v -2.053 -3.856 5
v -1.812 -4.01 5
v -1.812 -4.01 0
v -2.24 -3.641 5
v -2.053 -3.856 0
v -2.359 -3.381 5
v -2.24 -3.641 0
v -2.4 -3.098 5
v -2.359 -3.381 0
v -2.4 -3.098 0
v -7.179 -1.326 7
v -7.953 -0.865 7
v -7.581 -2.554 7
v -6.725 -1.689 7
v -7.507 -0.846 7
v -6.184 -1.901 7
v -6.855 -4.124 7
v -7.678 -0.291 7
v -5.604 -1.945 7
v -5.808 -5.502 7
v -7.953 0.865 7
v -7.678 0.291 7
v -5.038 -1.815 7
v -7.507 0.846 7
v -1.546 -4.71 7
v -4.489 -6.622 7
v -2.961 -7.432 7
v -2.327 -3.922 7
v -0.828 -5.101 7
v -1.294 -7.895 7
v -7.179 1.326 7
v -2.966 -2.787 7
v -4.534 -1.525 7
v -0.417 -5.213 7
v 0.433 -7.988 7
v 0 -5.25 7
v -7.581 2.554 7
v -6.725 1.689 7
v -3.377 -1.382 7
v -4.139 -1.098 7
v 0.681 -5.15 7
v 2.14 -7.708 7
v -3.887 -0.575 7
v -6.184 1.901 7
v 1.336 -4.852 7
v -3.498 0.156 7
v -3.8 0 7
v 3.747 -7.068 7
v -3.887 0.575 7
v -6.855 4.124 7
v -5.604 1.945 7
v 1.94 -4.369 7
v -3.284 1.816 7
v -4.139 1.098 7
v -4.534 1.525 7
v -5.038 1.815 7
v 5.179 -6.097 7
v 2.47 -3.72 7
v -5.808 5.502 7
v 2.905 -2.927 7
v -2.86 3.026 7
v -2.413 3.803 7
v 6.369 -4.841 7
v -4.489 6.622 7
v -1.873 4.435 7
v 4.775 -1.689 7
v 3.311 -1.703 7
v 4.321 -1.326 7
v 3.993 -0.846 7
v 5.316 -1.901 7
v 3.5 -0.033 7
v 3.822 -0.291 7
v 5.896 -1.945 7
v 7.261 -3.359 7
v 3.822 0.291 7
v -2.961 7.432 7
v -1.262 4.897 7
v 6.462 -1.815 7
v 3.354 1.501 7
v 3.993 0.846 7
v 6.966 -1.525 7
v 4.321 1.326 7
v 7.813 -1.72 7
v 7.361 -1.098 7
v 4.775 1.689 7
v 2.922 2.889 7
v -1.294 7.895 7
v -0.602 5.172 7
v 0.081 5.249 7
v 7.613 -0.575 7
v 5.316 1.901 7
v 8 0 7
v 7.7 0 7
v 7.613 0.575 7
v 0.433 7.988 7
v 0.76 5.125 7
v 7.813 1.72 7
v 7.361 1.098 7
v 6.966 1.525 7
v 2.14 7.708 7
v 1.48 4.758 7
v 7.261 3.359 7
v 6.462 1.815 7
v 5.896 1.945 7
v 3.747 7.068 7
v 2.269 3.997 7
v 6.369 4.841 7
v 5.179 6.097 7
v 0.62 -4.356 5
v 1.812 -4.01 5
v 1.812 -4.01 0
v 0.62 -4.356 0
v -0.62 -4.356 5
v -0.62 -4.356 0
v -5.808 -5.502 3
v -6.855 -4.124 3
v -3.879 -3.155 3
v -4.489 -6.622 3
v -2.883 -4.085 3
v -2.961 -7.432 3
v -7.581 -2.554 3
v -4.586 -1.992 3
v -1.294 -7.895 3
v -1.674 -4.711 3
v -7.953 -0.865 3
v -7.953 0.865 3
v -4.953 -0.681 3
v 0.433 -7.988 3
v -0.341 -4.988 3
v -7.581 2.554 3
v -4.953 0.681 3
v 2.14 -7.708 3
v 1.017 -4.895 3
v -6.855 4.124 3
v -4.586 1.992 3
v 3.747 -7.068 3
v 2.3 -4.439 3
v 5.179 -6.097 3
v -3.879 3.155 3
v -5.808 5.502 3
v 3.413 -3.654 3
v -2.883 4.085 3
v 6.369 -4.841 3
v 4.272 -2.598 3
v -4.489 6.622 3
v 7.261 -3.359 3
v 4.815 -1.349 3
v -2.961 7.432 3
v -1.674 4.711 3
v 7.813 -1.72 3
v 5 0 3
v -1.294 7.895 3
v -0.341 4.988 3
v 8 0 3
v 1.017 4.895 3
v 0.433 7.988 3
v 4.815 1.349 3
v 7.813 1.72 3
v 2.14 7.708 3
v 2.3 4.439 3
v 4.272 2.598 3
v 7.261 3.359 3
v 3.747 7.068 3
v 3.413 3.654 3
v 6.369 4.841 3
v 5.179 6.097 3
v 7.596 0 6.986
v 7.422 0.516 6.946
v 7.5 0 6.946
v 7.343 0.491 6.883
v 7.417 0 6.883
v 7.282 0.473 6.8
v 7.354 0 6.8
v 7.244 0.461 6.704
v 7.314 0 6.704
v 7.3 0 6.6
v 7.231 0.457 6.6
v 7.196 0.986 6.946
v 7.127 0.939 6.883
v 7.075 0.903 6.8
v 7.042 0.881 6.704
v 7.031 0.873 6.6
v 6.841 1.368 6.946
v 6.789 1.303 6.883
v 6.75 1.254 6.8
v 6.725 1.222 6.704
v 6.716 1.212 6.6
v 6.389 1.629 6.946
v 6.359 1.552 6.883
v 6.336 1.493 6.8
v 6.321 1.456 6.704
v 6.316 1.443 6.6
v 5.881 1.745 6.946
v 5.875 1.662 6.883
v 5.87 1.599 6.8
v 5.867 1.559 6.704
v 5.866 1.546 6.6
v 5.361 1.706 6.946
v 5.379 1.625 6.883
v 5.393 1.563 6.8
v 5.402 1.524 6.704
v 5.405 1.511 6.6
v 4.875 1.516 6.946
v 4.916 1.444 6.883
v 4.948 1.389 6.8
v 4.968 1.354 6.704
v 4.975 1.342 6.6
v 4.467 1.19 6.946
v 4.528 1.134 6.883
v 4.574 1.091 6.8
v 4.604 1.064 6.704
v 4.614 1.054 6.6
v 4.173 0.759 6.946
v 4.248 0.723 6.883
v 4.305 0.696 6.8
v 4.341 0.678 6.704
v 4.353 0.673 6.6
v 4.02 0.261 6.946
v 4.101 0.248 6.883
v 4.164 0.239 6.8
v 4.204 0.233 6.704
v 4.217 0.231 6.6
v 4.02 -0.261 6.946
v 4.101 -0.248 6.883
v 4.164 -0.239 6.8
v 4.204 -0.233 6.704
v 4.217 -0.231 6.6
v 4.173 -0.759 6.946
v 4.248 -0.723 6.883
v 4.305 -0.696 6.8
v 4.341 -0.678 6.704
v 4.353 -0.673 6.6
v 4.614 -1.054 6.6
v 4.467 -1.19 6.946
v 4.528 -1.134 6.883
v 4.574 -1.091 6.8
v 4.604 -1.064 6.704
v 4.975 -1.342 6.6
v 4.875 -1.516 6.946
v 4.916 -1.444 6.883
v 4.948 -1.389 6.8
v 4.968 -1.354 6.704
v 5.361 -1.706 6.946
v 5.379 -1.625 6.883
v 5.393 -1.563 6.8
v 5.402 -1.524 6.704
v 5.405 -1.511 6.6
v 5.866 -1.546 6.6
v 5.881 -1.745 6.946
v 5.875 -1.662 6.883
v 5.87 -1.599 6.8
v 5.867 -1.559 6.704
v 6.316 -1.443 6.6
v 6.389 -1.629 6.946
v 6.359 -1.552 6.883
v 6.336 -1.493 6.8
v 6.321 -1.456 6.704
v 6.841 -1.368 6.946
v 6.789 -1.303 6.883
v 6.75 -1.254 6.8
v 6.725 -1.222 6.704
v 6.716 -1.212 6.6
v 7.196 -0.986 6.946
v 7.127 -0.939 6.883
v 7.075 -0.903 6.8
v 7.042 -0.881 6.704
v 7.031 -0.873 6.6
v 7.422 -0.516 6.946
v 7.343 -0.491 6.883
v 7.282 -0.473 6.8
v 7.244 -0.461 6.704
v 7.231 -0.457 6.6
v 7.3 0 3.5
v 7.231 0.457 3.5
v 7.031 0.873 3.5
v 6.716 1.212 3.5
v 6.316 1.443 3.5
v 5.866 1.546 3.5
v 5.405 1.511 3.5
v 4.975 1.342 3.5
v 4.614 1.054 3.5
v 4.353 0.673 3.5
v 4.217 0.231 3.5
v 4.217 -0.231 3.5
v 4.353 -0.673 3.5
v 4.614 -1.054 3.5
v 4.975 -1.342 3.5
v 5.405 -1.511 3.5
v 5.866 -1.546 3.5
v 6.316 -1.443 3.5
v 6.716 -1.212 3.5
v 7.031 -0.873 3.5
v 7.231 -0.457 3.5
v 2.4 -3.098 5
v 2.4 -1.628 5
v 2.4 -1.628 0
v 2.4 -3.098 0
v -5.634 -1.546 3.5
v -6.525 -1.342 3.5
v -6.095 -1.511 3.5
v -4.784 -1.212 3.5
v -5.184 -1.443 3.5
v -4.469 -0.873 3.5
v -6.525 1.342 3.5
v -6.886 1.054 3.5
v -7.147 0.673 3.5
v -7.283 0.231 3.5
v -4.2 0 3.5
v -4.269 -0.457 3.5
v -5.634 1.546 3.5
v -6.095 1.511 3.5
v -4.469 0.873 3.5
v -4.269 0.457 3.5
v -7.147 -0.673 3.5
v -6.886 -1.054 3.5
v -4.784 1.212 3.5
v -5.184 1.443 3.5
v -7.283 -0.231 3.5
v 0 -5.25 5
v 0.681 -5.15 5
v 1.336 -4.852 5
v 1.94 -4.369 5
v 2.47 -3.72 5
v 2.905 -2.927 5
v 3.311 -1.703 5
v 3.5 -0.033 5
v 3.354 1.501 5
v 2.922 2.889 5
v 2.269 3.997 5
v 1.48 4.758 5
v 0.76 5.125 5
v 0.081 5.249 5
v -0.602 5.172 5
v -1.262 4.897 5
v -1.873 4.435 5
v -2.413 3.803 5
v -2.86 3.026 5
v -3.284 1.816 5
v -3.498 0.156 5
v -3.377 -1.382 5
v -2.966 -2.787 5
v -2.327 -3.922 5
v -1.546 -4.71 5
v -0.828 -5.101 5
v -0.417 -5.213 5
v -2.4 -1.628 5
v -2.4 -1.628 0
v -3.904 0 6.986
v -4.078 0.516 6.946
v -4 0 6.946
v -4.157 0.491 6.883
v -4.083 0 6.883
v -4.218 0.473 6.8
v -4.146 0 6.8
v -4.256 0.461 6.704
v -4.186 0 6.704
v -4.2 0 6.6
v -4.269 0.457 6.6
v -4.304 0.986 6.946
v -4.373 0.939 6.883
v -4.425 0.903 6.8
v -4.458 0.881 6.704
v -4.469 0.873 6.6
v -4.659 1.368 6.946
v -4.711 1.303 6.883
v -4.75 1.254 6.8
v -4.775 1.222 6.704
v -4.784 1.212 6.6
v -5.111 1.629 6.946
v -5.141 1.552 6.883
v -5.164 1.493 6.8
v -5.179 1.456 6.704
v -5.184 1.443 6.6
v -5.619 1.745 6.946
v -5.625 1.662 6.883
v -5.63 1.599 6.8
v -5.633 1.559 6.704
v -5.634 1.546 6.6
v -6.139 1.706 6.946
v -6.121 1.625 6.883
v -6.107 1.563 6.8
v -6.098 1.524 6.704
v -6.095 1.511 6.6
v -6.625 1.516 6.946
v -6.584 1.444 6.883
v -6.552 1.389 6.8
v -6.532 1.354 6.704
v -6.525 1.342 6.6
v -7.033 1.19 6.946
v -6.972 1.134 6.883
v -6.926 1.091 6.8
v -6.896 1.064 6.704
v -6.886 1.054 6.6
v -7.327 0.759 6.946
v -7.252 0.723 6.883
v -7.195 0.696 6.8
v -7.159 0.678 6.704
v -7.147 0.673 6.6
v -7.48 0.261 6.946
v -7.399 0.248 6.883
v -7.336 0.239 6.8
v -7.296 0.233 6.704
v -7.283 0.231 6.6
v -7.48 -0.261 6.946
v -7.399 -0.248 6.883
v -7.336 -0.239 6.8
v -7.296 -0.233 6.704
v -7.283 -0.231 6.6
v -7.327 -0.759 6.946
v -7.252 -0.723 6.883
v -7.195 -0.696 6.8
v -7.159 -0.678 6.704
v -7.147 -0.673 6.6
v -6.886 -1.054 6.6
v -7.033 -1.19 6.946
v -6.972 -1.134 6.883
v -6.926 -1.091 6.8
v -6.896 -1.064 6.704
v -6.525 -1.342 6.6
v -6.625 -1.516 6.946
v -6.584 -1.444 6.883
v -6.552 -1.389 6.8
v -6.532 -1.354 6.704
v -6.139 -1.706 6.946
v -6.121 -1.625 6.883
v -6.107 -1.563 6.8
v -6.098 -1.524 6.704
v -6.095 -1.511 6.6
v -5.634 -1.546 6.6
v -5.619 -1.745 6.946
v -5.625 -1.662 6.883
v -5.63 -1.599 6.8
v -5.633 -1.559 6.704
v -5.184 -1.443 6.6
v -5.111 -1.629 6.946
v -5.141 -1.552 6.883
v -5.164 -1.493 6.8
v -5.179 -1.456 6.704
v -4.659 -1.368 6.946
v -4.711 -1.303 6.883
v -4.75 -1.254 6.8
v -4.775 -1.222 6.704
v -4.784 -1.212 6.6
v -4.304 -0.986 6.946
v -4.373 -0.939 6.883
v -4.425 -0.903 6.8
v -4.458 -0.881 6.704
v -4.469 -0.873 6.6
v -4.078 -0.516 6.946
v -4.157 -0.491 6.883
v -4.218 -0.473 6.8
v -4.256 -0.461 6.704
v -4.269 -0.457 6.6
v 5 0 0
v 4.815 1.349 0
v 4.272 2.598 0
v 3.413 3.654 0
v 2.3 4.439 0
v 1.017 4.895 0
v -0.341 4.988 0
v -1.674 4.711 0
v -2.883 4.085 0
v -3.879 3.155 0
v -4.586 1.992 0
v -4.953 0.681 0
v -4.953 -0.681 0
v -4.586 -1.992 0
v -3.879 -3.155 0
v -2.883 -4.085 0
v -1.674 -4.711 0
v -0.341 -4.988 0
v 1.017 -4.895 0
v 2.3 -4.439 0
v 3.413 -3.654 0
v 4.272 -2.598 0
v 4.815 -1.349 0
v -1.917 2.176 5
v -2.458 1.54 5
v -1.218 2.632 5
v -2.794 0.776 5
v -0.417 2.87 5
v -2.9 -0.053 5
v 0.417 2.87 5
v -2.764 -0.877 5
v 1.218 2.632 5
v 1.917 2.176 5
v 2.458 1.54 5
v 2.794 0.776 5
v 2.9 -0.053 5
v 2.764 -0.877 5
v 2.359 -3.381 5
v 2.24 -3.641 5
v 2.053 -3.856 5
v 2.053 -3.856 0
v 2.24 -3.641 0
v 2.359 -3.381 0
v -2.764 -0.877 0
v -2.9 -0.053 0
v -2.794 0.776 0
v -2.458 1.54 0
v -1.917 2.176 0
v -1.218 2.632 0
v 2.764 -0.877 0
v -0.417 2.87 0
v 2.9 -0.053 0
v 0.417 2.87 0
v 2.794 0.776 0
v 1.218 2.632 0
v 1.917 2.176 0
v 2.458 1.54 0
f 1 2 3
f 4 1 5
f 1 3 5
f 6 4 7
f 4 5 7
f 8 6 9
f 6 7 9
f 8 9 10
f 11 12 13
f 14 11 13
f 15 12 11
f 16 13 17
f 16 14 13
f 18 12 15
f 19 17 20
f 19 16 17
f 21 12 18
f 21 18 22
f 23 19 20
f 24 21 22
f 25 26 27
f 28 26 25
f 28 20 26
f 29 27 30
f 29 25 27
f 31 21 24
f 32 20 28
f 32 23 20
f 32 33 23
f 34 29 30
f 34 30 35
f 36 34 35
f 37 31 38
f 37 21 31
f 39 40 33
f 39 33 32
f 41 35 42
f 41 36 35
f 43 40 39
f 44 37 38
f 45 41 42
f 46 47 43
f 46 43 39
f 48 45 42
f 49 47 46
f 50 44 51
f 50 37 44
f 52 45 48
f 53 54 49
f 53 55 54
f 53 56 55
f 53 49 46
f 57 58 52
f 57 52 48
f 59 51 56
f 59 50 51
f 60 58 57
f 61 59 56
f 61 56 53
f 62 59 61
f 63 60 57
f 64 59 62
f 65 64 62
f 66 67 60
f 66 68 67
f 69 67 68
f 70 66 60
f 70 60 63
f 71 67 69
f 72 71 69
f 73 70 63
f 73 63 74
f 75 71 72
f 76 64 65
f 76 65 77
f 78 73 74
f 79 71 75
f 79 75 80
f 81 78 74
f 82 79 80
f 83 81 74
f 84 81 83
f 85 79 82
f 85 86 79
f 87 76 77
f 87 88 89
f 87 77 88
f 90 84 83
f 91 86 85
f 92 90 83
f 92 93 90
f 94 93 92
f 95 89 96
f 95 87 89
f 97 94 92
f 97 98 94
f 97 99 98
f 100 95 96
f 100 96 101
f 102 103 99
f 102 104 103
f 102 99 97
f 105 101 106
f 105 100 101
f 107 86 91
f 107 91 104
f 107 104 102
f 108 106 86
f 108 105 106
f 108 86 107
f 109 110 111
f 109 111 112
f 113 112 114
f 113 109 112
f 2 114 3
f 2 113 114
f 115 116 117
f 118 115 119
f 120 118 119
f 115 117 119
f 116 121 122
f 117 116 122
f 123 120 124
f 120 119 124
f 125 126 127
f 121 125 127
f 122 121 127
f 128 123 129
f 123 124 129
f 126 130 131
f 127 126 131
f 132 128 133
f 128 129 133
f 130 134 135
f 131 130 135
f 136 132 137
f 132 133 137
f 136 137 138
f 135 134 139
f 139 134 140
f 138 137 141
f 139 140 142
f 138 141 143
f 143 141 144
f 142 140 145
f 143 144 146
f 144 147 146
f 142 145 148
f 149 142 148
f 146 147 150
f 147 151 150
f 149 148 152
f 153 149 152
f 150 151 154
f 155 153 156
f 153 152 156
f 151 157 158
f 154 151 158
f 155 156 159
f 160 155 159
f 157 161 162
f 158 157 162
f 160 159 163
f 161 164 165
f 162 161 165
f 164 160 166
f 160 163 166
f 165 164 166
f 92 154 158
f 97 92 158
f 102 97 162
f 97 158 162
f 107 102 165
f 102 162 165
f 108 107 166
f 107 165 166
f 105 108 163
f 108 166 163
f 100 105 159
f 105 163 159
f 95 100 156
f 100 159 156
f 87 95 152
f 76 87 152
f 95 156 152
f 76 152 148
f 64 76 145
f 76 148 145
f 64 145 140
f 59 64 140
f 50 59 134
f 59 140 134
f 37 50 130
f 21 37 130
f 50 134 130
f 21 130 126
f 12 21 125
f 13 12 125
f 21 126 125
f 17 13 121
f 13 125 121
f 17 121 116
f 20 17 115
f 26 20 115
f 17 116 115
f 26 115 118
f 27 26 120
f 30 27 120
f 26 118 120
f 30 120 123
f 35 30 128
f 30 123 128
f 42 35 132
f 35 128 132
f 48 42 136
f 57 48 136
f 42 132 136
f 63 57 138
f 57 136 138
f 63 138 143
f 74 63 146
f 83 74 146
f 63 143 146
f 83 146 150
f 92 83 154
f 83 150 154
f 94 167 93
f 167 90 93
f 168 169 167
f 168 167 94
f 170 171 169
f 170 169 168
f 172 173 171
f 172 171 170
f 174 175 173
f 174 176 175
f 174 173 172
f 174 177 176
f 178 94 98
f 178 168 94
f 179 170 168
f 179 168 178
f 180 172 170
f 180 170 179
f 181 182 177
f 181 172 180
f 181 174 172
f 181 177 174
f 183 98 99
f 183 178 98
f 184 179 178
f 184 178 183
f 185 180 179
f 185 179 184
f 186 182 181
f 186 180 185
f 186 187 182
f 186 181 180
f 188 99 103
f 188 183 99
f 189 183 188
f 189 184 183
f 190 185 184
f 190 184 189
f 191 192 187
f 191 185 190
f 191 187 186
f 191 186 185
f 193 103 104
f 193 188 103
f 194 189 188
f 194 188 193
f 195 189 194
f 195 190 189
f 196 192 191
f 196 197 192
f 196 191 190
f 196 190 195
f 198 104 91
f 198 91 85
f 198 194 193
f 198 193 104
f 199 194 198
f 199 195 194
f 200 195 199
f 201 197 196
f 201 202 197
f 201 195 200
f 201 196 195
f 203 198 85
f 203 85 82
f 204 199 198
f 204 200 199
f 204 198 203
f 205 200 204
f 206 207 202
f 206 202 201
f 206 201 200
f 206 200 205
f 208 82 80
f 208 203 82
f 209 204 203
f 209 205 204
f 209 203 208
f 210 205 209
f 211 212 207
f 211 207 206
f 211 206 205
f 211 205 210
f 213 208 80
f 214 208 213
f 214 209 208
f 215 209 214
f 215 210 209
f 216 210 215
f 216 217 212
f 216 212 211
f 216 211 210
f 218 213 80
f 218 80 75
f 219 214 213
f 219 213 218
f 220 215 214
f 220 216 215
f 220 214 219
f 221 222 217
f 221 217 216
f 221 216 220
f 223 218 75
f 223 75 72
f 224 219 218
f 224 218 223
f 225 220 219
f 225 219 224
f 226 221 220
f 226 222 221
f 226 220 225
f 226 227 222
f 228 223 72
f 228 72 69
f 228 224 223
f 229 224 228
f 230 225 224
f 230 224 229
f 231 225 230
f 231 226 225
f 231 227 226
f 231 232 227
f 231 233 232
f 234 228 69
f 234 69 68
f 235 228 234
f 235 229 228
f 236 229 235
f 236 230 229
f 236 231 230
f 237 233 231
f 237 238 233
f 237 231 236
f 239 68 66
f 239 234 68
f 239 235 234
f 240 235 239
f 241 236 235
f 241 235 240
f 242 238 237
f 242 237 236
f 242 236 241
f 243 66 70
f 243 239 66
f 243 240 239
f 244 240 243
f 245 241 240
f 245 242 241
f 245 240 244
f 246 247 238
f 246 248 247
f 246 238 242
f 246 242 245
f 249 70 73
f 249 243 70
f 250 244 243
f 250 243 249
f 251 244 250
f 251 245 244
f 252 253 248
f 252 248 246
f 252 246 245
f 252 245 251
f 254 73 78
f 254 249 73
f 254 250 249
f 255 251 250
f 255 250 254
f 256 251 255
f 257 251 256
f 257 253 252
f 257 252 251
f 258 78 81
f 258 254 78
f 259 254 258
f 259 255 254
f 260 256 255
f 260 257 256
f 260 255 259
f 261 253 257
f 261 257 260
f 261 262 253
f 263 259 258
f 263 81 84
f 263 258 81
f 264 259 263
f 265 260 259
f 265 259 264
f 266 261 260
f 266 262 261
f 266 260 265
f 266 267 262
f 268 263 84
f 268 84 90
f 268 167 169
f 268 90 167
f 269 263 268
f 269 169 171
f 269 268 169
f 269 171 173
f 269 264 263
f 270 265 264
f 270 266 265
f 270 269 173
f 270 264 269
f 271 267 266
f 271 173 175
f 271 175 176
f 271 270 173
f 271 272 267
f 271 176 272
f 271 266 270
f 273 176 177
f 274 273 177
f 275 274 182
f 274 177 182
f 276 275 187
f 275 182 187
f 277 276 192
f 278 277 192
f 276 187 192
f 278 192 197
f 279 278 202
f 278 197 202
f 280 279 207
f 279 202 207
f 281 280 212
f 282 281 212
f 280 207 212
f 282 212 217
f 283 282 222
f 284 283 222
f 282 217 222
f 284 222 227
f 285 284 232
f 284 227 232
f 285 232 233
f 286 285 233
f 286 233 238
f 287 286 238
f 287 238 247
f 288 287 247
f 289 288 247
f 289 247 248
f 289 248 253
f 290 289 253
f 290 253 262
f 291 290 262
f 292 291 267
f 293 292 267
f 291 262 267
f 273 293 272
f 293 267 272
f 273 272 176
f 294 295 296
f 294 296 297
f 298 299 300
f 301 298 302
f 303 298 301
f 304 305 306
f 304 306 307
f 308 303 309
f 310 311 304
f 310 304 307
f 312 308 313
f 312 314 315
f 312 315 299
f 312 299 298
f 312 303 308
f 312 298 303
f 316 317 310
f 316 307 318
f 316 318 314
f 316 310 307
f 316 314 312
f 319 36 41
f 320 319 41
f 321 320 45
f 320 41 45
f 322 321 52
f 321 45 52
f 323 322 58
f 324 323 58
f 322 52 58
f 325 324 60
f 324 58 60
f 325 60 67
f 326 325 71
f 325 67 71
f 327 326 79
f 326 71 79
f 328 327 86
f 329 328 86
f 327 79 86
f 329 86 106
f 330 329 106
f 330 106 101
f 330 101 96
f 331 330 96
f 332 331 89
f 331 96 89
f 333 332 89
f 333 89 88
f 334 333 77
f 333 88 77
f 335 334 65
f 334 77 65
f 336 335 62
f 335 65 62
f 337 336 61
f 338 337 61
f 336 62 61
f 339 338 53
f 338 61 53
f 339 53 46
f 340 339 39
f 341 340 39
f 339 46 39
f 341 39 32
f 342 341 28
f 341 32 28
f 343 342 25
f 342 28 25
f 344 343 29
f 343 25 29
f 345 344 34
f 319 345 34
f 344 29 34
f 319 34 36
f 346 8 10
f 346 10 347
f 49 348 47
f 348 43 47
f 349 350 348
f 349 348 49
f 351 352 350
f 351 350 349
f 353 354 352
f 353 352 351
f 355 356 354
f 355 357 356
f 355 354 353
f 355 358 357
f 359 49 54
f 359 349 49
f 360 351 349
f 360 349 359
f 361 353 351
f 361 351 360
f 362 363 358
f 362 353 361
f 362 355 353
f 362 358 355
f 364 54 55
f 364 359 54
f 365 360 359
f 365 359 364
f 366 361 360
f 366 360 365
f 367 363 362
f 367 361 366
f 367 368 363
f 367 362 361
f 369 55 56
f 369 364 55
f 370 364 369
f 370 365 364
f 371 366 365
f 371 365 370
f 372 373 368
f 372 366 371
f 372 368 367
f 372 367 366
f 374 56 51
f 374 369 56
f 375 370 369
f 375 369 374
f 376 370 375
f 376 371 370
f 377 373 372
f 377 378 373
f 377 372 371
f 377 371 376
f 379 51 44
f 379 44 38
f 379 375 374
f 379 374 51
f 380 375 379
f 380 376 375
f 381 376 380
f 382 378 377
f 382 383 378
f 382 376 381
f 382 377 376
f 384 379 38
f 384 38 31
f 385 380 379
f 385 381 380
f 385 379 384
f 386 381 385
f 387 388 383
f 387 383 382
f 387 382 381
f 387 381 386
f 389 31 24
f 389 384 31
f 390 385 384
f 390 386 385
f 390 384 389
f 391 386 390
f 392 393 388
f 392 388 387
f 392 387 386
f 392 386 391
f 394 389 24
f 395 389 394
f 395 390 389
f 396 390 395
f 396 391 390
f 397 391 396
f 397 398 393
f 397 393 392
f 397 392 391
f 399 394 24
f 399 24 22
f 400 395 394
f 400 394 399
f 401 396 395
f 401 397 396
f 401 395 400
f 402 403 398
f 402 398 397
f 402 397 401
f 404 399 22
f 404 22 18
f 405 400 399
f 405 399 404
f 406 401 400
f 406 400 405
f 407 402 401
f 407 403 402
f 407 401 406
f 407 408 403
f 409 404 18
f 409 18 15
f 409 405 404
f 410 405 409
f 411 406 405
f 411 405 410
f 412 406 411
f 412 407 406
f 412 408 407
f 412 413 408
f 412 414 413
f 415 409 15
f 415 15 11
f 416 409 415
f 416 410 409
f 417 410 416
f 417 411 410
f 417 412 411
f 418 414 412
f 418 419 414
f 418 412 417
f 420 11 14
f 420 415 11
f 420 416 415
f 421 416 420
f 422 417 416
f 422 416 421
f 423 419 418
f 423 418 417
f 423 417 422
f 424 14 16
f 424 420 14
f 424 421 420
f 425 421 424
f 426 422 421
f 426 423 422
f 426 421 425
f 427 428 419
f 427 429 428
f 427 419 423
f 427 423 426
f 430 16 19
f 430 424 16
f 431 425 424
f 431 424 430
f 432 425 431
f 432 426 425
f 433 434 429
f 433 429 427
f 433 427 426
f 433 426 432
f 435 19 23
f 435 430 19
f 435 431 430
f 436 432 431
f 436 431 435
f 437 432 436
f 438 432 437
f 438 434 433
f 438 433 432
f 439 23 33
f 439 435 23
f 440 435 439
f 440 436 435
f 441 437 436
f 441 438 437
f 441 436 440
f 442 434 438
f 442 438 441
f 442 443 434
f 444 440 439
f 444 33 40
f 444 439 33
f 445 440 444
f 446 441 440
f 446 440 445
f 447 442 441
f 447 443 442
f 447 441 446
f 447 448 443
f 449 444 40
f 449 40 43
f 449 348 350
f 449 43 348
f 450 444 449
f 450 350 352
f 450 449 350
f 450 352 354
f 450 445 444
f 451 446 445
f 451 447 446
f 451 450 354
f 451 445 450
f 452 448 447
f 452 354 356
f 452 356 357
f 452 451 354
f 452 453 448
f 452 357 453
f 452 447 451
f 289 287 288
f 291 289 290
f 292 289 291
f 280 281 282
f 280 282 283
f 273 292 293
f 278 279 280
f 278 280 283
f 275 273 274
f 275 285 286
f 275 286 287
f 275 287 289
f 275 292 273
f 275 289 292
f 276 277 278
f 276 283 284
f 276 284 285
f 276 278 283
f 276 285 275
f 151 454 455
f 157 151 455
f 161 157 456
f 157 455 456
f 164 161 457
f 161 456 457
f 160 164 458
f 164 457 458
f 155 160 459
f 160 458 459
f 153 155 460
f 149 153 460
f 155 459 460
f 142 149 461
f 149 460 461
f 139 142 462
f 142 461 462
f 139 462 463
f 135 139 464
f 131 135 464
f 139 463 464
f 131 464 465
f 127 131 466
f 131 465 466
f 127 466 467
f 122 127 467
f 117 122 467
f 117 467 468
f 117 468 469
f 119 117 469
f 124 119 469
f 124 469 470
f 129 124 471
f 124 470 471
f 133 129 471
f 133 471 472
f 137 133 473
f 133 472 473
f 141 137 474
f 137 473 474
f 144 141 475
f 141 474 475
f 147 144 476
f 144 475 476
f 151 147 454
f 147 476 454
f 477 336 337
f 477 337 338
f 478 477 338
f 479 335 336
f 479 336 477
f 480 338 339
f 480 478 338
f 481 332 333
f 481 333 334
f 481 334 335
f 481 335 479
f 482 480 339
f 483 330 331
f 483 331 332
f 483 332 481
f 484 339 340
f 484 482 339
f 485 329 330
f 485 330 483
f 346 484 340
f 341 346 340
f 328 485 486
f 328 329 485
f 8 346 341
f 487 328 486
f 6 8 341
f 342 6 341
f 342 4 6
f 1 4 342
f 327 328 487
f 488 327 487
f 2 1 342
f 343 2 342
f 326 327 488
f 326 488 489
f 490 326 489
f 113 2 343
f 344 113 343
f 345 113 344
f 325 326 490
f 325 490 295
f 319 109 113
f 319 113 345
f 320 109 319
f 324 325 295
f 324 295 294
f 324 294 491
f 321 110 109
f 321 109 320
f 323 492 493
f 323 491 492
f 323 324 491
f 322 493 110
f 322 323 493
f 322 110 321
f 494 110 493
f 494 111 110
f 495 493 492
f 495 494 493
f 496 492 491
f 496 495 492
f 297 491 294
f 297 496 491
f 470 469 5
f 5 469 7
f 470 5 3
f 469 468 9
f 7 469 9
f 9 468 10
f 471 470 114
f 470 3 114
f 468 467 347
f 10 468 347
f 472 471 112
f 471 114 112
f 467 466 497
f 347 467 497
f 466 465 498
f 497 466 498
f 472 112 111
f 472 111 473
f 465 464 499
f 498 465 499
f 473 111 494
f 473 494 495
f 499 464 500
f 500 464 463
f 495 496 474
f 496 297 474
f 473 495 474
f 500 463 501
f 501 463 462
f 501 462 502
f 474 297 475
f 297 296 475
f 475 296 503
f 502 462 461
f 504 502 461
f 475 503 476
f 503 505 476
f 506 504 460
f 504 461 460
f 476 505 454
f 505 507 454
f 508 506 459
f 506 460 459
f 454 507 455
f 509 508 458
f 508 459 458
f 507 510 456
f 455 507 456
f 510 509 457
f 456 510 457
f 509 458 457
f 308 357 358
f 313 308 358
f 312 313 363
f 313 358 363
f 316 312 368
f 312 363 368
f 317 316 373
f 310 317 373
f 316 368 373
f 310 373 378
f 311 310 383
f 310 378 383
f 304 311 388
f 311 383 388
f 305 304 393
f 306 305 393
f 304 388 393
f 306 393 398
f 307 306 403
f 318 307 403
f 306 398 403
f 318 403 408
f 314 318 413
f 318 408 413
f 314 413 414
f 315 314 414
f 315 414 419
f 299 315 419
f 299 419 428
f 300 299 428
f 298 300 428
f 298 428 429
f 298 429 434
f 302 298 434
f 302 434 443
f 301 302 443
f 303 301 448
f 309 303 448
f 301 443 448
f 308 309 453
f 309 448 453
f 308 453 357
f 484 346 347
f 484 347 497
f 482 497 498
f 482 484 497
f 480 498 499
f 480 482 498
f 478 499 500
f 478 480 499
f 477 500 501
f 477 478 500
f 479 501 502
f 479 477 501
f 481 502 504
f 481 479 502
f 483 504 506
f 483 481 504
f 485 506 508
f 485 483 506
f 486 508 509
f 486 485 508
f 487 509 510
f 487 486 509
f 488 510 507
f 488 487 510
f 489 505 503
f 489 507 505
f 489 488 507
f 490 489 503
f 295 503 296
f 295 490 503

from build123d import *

# Parameters (mm, degrees)
SKETCH1_R           = 5
SKETCH1_R_2         = 1
BOSS_EXTRUDE1_DEPTH = 3
SKETCH2_R           = 8
BOSS_EXTRUDE2_DEPTH = 4
SKETCH4_R           = 1
CUT_EXTRUDE2_DEPTH  = 8
SKETCH3_RX          = 5.25
SKETCH3_RY          = 3.5
CUT_EXTRUDE1_DEPTH  = 2
SKETCH10_R          = 1
CUT_EXTRUDE5_DEPTH  = 7
SKETCH9_R           = 1.55
CUT_EXTRUDE4_DEPTH  = 3.5
CUT_EXTRUDE9_DEPTH  = 10
FILLET3_R           = 1
FILLET1_R           = 0.4


with BuildPart() as part:
    # Sketch1 → Boss-Extrude1 (new body)
    with BuildSketch(Plane.XY):
        Circle(SKETCH1_R)
        Circle(SKETCH1_R_2, mode=Mode.SUBTRACT)
    extrude(amount=BOSS_EXTRUDE1_DEPTH)

    # Sketch2 → Boss-Extrude2 (add)
    with BuildSketch(Plane.XY.offset(3)):
        Circle(SKETCH2_R)
    extrude(amount=BOSS_EXTRUDE2_DEPTH)

    # Sketch4 → Cut-Extrude2 (cut)
    with BuildSketch(Plane(origin=(0, 0, 3), x_dir=(-1, 0, 0), z_dir=(0, 0, -1))):
        with Locations(Location((0, 0, 0), (0, 0, 180))):
            Circle(SKETCH4_R)
    extrude(amount=-CUT_EXTRUDE2_DEPTH, mode=Mode.SUBTRACT)

    # Sketch3 → Cut-Extrude1 (cut)
    with BuildSketch(Plane.XY.offset(7)):
        with Locations(Location((0, 0), (0, 0, -90))):
            Ellipse(SKETCH3_RX, SKETCH3_RY)
    extrude(amount=-CUT_EXTRUDE1_DEPTH, mode=Mode.SUBTRACT)

    # Sketch10 → Cut-Extrude5 (cut)
    with BuildSketch(Plane(origin=(0, 0, 0), x_dir=(-1, 0, 0), z_dir=(0, 0, -1))):
        with BuildLine():
            Line((-2.25, -1.58113883), (-2.25, -3.605551275))
            ThreePointArc((-2.25, -3.605551275), (0, -4.25), (2.25, -3.605551275))
            Line((2.25, -3.605551275), (2.25, -1.58113883))
            ThreePointArc((2.25, -1.58113883), (0, 2.75), (-2.25, -1.58113883))
        make_face()
        Circle(SKETCH10_R, mode=Mode.SUBTRACT)
    extrude(amount=-CUT_EXTRUDE5_DEPTH, mode=Mode.SUBTRACT)

    # Sketch9 → Cut-Extrude4 (cut)
    with BuildSketch(Plane.XY.offset(7)):
        with Locations((-5.75, 0)):
            Circle(SKETCH9_R)
        with Locations((5.75, 0)):
            Circle(SKETCH9_R)
    extrude(amount=-CUT_EXTRUDE4_DEPTH, mode=Mode.SUBTRACT)

    # Sketch14 → Cut-Extrude9 (cut)
    with BuildSketch(Plane.XY.offset(5)):
        with BuildLine():
            Line((-2.4, -3.687817783), (-2.4, -1.62788206))
            ThreePointArc((-2.4, -1.62788206), (0, 2.9), (2.4, -1.62788206))
            Line((2.4, -1.62788206), (2.4, -3.687817783))
            ThreePointArc((2.4, -3.687817783), (0, -4.4), (-2.4, -3.687817783))
        make_face()
        with BuildLine():
            Line((2.25, -3.605551275), (2.25, -1.58113883))
            ThreePointArc((2.25, -1.58113883), (0, 2.75), (-2.25, -1.58113883))
            Line((-2.25, -1.58113883), (-2.25, -3.605551275))
            ThreePointArc((-2.25, -3.605551275), (0, -4.25), (2.25, -3.605551275))
        make_face(mode=Mode.SUBTRACT)
    extrude(amount=-CUT_EXTRUDE9_DEPTH, mode=Mode.SUBTRACT)

    # Fillet3
    fillet3_edges = [part.edges().sort_by_distance(p)[0] for p in [
        (2.4, -3.687817783, 2.5),
        (-2.4, -3.687817783, 2.5),
    ]]
    fillet(fillet3_edges, radius=FILLET3_R)

    # Fillet1
    fillet1_edges = [part.edges().sort_by_distance(p)[0] for p in [
        (-7.3, 0, 7),
        (4.2, 0, 7),
    ]]
    fillet(fillet1_edges, radius=FILLET1_R)


solid = part.part
